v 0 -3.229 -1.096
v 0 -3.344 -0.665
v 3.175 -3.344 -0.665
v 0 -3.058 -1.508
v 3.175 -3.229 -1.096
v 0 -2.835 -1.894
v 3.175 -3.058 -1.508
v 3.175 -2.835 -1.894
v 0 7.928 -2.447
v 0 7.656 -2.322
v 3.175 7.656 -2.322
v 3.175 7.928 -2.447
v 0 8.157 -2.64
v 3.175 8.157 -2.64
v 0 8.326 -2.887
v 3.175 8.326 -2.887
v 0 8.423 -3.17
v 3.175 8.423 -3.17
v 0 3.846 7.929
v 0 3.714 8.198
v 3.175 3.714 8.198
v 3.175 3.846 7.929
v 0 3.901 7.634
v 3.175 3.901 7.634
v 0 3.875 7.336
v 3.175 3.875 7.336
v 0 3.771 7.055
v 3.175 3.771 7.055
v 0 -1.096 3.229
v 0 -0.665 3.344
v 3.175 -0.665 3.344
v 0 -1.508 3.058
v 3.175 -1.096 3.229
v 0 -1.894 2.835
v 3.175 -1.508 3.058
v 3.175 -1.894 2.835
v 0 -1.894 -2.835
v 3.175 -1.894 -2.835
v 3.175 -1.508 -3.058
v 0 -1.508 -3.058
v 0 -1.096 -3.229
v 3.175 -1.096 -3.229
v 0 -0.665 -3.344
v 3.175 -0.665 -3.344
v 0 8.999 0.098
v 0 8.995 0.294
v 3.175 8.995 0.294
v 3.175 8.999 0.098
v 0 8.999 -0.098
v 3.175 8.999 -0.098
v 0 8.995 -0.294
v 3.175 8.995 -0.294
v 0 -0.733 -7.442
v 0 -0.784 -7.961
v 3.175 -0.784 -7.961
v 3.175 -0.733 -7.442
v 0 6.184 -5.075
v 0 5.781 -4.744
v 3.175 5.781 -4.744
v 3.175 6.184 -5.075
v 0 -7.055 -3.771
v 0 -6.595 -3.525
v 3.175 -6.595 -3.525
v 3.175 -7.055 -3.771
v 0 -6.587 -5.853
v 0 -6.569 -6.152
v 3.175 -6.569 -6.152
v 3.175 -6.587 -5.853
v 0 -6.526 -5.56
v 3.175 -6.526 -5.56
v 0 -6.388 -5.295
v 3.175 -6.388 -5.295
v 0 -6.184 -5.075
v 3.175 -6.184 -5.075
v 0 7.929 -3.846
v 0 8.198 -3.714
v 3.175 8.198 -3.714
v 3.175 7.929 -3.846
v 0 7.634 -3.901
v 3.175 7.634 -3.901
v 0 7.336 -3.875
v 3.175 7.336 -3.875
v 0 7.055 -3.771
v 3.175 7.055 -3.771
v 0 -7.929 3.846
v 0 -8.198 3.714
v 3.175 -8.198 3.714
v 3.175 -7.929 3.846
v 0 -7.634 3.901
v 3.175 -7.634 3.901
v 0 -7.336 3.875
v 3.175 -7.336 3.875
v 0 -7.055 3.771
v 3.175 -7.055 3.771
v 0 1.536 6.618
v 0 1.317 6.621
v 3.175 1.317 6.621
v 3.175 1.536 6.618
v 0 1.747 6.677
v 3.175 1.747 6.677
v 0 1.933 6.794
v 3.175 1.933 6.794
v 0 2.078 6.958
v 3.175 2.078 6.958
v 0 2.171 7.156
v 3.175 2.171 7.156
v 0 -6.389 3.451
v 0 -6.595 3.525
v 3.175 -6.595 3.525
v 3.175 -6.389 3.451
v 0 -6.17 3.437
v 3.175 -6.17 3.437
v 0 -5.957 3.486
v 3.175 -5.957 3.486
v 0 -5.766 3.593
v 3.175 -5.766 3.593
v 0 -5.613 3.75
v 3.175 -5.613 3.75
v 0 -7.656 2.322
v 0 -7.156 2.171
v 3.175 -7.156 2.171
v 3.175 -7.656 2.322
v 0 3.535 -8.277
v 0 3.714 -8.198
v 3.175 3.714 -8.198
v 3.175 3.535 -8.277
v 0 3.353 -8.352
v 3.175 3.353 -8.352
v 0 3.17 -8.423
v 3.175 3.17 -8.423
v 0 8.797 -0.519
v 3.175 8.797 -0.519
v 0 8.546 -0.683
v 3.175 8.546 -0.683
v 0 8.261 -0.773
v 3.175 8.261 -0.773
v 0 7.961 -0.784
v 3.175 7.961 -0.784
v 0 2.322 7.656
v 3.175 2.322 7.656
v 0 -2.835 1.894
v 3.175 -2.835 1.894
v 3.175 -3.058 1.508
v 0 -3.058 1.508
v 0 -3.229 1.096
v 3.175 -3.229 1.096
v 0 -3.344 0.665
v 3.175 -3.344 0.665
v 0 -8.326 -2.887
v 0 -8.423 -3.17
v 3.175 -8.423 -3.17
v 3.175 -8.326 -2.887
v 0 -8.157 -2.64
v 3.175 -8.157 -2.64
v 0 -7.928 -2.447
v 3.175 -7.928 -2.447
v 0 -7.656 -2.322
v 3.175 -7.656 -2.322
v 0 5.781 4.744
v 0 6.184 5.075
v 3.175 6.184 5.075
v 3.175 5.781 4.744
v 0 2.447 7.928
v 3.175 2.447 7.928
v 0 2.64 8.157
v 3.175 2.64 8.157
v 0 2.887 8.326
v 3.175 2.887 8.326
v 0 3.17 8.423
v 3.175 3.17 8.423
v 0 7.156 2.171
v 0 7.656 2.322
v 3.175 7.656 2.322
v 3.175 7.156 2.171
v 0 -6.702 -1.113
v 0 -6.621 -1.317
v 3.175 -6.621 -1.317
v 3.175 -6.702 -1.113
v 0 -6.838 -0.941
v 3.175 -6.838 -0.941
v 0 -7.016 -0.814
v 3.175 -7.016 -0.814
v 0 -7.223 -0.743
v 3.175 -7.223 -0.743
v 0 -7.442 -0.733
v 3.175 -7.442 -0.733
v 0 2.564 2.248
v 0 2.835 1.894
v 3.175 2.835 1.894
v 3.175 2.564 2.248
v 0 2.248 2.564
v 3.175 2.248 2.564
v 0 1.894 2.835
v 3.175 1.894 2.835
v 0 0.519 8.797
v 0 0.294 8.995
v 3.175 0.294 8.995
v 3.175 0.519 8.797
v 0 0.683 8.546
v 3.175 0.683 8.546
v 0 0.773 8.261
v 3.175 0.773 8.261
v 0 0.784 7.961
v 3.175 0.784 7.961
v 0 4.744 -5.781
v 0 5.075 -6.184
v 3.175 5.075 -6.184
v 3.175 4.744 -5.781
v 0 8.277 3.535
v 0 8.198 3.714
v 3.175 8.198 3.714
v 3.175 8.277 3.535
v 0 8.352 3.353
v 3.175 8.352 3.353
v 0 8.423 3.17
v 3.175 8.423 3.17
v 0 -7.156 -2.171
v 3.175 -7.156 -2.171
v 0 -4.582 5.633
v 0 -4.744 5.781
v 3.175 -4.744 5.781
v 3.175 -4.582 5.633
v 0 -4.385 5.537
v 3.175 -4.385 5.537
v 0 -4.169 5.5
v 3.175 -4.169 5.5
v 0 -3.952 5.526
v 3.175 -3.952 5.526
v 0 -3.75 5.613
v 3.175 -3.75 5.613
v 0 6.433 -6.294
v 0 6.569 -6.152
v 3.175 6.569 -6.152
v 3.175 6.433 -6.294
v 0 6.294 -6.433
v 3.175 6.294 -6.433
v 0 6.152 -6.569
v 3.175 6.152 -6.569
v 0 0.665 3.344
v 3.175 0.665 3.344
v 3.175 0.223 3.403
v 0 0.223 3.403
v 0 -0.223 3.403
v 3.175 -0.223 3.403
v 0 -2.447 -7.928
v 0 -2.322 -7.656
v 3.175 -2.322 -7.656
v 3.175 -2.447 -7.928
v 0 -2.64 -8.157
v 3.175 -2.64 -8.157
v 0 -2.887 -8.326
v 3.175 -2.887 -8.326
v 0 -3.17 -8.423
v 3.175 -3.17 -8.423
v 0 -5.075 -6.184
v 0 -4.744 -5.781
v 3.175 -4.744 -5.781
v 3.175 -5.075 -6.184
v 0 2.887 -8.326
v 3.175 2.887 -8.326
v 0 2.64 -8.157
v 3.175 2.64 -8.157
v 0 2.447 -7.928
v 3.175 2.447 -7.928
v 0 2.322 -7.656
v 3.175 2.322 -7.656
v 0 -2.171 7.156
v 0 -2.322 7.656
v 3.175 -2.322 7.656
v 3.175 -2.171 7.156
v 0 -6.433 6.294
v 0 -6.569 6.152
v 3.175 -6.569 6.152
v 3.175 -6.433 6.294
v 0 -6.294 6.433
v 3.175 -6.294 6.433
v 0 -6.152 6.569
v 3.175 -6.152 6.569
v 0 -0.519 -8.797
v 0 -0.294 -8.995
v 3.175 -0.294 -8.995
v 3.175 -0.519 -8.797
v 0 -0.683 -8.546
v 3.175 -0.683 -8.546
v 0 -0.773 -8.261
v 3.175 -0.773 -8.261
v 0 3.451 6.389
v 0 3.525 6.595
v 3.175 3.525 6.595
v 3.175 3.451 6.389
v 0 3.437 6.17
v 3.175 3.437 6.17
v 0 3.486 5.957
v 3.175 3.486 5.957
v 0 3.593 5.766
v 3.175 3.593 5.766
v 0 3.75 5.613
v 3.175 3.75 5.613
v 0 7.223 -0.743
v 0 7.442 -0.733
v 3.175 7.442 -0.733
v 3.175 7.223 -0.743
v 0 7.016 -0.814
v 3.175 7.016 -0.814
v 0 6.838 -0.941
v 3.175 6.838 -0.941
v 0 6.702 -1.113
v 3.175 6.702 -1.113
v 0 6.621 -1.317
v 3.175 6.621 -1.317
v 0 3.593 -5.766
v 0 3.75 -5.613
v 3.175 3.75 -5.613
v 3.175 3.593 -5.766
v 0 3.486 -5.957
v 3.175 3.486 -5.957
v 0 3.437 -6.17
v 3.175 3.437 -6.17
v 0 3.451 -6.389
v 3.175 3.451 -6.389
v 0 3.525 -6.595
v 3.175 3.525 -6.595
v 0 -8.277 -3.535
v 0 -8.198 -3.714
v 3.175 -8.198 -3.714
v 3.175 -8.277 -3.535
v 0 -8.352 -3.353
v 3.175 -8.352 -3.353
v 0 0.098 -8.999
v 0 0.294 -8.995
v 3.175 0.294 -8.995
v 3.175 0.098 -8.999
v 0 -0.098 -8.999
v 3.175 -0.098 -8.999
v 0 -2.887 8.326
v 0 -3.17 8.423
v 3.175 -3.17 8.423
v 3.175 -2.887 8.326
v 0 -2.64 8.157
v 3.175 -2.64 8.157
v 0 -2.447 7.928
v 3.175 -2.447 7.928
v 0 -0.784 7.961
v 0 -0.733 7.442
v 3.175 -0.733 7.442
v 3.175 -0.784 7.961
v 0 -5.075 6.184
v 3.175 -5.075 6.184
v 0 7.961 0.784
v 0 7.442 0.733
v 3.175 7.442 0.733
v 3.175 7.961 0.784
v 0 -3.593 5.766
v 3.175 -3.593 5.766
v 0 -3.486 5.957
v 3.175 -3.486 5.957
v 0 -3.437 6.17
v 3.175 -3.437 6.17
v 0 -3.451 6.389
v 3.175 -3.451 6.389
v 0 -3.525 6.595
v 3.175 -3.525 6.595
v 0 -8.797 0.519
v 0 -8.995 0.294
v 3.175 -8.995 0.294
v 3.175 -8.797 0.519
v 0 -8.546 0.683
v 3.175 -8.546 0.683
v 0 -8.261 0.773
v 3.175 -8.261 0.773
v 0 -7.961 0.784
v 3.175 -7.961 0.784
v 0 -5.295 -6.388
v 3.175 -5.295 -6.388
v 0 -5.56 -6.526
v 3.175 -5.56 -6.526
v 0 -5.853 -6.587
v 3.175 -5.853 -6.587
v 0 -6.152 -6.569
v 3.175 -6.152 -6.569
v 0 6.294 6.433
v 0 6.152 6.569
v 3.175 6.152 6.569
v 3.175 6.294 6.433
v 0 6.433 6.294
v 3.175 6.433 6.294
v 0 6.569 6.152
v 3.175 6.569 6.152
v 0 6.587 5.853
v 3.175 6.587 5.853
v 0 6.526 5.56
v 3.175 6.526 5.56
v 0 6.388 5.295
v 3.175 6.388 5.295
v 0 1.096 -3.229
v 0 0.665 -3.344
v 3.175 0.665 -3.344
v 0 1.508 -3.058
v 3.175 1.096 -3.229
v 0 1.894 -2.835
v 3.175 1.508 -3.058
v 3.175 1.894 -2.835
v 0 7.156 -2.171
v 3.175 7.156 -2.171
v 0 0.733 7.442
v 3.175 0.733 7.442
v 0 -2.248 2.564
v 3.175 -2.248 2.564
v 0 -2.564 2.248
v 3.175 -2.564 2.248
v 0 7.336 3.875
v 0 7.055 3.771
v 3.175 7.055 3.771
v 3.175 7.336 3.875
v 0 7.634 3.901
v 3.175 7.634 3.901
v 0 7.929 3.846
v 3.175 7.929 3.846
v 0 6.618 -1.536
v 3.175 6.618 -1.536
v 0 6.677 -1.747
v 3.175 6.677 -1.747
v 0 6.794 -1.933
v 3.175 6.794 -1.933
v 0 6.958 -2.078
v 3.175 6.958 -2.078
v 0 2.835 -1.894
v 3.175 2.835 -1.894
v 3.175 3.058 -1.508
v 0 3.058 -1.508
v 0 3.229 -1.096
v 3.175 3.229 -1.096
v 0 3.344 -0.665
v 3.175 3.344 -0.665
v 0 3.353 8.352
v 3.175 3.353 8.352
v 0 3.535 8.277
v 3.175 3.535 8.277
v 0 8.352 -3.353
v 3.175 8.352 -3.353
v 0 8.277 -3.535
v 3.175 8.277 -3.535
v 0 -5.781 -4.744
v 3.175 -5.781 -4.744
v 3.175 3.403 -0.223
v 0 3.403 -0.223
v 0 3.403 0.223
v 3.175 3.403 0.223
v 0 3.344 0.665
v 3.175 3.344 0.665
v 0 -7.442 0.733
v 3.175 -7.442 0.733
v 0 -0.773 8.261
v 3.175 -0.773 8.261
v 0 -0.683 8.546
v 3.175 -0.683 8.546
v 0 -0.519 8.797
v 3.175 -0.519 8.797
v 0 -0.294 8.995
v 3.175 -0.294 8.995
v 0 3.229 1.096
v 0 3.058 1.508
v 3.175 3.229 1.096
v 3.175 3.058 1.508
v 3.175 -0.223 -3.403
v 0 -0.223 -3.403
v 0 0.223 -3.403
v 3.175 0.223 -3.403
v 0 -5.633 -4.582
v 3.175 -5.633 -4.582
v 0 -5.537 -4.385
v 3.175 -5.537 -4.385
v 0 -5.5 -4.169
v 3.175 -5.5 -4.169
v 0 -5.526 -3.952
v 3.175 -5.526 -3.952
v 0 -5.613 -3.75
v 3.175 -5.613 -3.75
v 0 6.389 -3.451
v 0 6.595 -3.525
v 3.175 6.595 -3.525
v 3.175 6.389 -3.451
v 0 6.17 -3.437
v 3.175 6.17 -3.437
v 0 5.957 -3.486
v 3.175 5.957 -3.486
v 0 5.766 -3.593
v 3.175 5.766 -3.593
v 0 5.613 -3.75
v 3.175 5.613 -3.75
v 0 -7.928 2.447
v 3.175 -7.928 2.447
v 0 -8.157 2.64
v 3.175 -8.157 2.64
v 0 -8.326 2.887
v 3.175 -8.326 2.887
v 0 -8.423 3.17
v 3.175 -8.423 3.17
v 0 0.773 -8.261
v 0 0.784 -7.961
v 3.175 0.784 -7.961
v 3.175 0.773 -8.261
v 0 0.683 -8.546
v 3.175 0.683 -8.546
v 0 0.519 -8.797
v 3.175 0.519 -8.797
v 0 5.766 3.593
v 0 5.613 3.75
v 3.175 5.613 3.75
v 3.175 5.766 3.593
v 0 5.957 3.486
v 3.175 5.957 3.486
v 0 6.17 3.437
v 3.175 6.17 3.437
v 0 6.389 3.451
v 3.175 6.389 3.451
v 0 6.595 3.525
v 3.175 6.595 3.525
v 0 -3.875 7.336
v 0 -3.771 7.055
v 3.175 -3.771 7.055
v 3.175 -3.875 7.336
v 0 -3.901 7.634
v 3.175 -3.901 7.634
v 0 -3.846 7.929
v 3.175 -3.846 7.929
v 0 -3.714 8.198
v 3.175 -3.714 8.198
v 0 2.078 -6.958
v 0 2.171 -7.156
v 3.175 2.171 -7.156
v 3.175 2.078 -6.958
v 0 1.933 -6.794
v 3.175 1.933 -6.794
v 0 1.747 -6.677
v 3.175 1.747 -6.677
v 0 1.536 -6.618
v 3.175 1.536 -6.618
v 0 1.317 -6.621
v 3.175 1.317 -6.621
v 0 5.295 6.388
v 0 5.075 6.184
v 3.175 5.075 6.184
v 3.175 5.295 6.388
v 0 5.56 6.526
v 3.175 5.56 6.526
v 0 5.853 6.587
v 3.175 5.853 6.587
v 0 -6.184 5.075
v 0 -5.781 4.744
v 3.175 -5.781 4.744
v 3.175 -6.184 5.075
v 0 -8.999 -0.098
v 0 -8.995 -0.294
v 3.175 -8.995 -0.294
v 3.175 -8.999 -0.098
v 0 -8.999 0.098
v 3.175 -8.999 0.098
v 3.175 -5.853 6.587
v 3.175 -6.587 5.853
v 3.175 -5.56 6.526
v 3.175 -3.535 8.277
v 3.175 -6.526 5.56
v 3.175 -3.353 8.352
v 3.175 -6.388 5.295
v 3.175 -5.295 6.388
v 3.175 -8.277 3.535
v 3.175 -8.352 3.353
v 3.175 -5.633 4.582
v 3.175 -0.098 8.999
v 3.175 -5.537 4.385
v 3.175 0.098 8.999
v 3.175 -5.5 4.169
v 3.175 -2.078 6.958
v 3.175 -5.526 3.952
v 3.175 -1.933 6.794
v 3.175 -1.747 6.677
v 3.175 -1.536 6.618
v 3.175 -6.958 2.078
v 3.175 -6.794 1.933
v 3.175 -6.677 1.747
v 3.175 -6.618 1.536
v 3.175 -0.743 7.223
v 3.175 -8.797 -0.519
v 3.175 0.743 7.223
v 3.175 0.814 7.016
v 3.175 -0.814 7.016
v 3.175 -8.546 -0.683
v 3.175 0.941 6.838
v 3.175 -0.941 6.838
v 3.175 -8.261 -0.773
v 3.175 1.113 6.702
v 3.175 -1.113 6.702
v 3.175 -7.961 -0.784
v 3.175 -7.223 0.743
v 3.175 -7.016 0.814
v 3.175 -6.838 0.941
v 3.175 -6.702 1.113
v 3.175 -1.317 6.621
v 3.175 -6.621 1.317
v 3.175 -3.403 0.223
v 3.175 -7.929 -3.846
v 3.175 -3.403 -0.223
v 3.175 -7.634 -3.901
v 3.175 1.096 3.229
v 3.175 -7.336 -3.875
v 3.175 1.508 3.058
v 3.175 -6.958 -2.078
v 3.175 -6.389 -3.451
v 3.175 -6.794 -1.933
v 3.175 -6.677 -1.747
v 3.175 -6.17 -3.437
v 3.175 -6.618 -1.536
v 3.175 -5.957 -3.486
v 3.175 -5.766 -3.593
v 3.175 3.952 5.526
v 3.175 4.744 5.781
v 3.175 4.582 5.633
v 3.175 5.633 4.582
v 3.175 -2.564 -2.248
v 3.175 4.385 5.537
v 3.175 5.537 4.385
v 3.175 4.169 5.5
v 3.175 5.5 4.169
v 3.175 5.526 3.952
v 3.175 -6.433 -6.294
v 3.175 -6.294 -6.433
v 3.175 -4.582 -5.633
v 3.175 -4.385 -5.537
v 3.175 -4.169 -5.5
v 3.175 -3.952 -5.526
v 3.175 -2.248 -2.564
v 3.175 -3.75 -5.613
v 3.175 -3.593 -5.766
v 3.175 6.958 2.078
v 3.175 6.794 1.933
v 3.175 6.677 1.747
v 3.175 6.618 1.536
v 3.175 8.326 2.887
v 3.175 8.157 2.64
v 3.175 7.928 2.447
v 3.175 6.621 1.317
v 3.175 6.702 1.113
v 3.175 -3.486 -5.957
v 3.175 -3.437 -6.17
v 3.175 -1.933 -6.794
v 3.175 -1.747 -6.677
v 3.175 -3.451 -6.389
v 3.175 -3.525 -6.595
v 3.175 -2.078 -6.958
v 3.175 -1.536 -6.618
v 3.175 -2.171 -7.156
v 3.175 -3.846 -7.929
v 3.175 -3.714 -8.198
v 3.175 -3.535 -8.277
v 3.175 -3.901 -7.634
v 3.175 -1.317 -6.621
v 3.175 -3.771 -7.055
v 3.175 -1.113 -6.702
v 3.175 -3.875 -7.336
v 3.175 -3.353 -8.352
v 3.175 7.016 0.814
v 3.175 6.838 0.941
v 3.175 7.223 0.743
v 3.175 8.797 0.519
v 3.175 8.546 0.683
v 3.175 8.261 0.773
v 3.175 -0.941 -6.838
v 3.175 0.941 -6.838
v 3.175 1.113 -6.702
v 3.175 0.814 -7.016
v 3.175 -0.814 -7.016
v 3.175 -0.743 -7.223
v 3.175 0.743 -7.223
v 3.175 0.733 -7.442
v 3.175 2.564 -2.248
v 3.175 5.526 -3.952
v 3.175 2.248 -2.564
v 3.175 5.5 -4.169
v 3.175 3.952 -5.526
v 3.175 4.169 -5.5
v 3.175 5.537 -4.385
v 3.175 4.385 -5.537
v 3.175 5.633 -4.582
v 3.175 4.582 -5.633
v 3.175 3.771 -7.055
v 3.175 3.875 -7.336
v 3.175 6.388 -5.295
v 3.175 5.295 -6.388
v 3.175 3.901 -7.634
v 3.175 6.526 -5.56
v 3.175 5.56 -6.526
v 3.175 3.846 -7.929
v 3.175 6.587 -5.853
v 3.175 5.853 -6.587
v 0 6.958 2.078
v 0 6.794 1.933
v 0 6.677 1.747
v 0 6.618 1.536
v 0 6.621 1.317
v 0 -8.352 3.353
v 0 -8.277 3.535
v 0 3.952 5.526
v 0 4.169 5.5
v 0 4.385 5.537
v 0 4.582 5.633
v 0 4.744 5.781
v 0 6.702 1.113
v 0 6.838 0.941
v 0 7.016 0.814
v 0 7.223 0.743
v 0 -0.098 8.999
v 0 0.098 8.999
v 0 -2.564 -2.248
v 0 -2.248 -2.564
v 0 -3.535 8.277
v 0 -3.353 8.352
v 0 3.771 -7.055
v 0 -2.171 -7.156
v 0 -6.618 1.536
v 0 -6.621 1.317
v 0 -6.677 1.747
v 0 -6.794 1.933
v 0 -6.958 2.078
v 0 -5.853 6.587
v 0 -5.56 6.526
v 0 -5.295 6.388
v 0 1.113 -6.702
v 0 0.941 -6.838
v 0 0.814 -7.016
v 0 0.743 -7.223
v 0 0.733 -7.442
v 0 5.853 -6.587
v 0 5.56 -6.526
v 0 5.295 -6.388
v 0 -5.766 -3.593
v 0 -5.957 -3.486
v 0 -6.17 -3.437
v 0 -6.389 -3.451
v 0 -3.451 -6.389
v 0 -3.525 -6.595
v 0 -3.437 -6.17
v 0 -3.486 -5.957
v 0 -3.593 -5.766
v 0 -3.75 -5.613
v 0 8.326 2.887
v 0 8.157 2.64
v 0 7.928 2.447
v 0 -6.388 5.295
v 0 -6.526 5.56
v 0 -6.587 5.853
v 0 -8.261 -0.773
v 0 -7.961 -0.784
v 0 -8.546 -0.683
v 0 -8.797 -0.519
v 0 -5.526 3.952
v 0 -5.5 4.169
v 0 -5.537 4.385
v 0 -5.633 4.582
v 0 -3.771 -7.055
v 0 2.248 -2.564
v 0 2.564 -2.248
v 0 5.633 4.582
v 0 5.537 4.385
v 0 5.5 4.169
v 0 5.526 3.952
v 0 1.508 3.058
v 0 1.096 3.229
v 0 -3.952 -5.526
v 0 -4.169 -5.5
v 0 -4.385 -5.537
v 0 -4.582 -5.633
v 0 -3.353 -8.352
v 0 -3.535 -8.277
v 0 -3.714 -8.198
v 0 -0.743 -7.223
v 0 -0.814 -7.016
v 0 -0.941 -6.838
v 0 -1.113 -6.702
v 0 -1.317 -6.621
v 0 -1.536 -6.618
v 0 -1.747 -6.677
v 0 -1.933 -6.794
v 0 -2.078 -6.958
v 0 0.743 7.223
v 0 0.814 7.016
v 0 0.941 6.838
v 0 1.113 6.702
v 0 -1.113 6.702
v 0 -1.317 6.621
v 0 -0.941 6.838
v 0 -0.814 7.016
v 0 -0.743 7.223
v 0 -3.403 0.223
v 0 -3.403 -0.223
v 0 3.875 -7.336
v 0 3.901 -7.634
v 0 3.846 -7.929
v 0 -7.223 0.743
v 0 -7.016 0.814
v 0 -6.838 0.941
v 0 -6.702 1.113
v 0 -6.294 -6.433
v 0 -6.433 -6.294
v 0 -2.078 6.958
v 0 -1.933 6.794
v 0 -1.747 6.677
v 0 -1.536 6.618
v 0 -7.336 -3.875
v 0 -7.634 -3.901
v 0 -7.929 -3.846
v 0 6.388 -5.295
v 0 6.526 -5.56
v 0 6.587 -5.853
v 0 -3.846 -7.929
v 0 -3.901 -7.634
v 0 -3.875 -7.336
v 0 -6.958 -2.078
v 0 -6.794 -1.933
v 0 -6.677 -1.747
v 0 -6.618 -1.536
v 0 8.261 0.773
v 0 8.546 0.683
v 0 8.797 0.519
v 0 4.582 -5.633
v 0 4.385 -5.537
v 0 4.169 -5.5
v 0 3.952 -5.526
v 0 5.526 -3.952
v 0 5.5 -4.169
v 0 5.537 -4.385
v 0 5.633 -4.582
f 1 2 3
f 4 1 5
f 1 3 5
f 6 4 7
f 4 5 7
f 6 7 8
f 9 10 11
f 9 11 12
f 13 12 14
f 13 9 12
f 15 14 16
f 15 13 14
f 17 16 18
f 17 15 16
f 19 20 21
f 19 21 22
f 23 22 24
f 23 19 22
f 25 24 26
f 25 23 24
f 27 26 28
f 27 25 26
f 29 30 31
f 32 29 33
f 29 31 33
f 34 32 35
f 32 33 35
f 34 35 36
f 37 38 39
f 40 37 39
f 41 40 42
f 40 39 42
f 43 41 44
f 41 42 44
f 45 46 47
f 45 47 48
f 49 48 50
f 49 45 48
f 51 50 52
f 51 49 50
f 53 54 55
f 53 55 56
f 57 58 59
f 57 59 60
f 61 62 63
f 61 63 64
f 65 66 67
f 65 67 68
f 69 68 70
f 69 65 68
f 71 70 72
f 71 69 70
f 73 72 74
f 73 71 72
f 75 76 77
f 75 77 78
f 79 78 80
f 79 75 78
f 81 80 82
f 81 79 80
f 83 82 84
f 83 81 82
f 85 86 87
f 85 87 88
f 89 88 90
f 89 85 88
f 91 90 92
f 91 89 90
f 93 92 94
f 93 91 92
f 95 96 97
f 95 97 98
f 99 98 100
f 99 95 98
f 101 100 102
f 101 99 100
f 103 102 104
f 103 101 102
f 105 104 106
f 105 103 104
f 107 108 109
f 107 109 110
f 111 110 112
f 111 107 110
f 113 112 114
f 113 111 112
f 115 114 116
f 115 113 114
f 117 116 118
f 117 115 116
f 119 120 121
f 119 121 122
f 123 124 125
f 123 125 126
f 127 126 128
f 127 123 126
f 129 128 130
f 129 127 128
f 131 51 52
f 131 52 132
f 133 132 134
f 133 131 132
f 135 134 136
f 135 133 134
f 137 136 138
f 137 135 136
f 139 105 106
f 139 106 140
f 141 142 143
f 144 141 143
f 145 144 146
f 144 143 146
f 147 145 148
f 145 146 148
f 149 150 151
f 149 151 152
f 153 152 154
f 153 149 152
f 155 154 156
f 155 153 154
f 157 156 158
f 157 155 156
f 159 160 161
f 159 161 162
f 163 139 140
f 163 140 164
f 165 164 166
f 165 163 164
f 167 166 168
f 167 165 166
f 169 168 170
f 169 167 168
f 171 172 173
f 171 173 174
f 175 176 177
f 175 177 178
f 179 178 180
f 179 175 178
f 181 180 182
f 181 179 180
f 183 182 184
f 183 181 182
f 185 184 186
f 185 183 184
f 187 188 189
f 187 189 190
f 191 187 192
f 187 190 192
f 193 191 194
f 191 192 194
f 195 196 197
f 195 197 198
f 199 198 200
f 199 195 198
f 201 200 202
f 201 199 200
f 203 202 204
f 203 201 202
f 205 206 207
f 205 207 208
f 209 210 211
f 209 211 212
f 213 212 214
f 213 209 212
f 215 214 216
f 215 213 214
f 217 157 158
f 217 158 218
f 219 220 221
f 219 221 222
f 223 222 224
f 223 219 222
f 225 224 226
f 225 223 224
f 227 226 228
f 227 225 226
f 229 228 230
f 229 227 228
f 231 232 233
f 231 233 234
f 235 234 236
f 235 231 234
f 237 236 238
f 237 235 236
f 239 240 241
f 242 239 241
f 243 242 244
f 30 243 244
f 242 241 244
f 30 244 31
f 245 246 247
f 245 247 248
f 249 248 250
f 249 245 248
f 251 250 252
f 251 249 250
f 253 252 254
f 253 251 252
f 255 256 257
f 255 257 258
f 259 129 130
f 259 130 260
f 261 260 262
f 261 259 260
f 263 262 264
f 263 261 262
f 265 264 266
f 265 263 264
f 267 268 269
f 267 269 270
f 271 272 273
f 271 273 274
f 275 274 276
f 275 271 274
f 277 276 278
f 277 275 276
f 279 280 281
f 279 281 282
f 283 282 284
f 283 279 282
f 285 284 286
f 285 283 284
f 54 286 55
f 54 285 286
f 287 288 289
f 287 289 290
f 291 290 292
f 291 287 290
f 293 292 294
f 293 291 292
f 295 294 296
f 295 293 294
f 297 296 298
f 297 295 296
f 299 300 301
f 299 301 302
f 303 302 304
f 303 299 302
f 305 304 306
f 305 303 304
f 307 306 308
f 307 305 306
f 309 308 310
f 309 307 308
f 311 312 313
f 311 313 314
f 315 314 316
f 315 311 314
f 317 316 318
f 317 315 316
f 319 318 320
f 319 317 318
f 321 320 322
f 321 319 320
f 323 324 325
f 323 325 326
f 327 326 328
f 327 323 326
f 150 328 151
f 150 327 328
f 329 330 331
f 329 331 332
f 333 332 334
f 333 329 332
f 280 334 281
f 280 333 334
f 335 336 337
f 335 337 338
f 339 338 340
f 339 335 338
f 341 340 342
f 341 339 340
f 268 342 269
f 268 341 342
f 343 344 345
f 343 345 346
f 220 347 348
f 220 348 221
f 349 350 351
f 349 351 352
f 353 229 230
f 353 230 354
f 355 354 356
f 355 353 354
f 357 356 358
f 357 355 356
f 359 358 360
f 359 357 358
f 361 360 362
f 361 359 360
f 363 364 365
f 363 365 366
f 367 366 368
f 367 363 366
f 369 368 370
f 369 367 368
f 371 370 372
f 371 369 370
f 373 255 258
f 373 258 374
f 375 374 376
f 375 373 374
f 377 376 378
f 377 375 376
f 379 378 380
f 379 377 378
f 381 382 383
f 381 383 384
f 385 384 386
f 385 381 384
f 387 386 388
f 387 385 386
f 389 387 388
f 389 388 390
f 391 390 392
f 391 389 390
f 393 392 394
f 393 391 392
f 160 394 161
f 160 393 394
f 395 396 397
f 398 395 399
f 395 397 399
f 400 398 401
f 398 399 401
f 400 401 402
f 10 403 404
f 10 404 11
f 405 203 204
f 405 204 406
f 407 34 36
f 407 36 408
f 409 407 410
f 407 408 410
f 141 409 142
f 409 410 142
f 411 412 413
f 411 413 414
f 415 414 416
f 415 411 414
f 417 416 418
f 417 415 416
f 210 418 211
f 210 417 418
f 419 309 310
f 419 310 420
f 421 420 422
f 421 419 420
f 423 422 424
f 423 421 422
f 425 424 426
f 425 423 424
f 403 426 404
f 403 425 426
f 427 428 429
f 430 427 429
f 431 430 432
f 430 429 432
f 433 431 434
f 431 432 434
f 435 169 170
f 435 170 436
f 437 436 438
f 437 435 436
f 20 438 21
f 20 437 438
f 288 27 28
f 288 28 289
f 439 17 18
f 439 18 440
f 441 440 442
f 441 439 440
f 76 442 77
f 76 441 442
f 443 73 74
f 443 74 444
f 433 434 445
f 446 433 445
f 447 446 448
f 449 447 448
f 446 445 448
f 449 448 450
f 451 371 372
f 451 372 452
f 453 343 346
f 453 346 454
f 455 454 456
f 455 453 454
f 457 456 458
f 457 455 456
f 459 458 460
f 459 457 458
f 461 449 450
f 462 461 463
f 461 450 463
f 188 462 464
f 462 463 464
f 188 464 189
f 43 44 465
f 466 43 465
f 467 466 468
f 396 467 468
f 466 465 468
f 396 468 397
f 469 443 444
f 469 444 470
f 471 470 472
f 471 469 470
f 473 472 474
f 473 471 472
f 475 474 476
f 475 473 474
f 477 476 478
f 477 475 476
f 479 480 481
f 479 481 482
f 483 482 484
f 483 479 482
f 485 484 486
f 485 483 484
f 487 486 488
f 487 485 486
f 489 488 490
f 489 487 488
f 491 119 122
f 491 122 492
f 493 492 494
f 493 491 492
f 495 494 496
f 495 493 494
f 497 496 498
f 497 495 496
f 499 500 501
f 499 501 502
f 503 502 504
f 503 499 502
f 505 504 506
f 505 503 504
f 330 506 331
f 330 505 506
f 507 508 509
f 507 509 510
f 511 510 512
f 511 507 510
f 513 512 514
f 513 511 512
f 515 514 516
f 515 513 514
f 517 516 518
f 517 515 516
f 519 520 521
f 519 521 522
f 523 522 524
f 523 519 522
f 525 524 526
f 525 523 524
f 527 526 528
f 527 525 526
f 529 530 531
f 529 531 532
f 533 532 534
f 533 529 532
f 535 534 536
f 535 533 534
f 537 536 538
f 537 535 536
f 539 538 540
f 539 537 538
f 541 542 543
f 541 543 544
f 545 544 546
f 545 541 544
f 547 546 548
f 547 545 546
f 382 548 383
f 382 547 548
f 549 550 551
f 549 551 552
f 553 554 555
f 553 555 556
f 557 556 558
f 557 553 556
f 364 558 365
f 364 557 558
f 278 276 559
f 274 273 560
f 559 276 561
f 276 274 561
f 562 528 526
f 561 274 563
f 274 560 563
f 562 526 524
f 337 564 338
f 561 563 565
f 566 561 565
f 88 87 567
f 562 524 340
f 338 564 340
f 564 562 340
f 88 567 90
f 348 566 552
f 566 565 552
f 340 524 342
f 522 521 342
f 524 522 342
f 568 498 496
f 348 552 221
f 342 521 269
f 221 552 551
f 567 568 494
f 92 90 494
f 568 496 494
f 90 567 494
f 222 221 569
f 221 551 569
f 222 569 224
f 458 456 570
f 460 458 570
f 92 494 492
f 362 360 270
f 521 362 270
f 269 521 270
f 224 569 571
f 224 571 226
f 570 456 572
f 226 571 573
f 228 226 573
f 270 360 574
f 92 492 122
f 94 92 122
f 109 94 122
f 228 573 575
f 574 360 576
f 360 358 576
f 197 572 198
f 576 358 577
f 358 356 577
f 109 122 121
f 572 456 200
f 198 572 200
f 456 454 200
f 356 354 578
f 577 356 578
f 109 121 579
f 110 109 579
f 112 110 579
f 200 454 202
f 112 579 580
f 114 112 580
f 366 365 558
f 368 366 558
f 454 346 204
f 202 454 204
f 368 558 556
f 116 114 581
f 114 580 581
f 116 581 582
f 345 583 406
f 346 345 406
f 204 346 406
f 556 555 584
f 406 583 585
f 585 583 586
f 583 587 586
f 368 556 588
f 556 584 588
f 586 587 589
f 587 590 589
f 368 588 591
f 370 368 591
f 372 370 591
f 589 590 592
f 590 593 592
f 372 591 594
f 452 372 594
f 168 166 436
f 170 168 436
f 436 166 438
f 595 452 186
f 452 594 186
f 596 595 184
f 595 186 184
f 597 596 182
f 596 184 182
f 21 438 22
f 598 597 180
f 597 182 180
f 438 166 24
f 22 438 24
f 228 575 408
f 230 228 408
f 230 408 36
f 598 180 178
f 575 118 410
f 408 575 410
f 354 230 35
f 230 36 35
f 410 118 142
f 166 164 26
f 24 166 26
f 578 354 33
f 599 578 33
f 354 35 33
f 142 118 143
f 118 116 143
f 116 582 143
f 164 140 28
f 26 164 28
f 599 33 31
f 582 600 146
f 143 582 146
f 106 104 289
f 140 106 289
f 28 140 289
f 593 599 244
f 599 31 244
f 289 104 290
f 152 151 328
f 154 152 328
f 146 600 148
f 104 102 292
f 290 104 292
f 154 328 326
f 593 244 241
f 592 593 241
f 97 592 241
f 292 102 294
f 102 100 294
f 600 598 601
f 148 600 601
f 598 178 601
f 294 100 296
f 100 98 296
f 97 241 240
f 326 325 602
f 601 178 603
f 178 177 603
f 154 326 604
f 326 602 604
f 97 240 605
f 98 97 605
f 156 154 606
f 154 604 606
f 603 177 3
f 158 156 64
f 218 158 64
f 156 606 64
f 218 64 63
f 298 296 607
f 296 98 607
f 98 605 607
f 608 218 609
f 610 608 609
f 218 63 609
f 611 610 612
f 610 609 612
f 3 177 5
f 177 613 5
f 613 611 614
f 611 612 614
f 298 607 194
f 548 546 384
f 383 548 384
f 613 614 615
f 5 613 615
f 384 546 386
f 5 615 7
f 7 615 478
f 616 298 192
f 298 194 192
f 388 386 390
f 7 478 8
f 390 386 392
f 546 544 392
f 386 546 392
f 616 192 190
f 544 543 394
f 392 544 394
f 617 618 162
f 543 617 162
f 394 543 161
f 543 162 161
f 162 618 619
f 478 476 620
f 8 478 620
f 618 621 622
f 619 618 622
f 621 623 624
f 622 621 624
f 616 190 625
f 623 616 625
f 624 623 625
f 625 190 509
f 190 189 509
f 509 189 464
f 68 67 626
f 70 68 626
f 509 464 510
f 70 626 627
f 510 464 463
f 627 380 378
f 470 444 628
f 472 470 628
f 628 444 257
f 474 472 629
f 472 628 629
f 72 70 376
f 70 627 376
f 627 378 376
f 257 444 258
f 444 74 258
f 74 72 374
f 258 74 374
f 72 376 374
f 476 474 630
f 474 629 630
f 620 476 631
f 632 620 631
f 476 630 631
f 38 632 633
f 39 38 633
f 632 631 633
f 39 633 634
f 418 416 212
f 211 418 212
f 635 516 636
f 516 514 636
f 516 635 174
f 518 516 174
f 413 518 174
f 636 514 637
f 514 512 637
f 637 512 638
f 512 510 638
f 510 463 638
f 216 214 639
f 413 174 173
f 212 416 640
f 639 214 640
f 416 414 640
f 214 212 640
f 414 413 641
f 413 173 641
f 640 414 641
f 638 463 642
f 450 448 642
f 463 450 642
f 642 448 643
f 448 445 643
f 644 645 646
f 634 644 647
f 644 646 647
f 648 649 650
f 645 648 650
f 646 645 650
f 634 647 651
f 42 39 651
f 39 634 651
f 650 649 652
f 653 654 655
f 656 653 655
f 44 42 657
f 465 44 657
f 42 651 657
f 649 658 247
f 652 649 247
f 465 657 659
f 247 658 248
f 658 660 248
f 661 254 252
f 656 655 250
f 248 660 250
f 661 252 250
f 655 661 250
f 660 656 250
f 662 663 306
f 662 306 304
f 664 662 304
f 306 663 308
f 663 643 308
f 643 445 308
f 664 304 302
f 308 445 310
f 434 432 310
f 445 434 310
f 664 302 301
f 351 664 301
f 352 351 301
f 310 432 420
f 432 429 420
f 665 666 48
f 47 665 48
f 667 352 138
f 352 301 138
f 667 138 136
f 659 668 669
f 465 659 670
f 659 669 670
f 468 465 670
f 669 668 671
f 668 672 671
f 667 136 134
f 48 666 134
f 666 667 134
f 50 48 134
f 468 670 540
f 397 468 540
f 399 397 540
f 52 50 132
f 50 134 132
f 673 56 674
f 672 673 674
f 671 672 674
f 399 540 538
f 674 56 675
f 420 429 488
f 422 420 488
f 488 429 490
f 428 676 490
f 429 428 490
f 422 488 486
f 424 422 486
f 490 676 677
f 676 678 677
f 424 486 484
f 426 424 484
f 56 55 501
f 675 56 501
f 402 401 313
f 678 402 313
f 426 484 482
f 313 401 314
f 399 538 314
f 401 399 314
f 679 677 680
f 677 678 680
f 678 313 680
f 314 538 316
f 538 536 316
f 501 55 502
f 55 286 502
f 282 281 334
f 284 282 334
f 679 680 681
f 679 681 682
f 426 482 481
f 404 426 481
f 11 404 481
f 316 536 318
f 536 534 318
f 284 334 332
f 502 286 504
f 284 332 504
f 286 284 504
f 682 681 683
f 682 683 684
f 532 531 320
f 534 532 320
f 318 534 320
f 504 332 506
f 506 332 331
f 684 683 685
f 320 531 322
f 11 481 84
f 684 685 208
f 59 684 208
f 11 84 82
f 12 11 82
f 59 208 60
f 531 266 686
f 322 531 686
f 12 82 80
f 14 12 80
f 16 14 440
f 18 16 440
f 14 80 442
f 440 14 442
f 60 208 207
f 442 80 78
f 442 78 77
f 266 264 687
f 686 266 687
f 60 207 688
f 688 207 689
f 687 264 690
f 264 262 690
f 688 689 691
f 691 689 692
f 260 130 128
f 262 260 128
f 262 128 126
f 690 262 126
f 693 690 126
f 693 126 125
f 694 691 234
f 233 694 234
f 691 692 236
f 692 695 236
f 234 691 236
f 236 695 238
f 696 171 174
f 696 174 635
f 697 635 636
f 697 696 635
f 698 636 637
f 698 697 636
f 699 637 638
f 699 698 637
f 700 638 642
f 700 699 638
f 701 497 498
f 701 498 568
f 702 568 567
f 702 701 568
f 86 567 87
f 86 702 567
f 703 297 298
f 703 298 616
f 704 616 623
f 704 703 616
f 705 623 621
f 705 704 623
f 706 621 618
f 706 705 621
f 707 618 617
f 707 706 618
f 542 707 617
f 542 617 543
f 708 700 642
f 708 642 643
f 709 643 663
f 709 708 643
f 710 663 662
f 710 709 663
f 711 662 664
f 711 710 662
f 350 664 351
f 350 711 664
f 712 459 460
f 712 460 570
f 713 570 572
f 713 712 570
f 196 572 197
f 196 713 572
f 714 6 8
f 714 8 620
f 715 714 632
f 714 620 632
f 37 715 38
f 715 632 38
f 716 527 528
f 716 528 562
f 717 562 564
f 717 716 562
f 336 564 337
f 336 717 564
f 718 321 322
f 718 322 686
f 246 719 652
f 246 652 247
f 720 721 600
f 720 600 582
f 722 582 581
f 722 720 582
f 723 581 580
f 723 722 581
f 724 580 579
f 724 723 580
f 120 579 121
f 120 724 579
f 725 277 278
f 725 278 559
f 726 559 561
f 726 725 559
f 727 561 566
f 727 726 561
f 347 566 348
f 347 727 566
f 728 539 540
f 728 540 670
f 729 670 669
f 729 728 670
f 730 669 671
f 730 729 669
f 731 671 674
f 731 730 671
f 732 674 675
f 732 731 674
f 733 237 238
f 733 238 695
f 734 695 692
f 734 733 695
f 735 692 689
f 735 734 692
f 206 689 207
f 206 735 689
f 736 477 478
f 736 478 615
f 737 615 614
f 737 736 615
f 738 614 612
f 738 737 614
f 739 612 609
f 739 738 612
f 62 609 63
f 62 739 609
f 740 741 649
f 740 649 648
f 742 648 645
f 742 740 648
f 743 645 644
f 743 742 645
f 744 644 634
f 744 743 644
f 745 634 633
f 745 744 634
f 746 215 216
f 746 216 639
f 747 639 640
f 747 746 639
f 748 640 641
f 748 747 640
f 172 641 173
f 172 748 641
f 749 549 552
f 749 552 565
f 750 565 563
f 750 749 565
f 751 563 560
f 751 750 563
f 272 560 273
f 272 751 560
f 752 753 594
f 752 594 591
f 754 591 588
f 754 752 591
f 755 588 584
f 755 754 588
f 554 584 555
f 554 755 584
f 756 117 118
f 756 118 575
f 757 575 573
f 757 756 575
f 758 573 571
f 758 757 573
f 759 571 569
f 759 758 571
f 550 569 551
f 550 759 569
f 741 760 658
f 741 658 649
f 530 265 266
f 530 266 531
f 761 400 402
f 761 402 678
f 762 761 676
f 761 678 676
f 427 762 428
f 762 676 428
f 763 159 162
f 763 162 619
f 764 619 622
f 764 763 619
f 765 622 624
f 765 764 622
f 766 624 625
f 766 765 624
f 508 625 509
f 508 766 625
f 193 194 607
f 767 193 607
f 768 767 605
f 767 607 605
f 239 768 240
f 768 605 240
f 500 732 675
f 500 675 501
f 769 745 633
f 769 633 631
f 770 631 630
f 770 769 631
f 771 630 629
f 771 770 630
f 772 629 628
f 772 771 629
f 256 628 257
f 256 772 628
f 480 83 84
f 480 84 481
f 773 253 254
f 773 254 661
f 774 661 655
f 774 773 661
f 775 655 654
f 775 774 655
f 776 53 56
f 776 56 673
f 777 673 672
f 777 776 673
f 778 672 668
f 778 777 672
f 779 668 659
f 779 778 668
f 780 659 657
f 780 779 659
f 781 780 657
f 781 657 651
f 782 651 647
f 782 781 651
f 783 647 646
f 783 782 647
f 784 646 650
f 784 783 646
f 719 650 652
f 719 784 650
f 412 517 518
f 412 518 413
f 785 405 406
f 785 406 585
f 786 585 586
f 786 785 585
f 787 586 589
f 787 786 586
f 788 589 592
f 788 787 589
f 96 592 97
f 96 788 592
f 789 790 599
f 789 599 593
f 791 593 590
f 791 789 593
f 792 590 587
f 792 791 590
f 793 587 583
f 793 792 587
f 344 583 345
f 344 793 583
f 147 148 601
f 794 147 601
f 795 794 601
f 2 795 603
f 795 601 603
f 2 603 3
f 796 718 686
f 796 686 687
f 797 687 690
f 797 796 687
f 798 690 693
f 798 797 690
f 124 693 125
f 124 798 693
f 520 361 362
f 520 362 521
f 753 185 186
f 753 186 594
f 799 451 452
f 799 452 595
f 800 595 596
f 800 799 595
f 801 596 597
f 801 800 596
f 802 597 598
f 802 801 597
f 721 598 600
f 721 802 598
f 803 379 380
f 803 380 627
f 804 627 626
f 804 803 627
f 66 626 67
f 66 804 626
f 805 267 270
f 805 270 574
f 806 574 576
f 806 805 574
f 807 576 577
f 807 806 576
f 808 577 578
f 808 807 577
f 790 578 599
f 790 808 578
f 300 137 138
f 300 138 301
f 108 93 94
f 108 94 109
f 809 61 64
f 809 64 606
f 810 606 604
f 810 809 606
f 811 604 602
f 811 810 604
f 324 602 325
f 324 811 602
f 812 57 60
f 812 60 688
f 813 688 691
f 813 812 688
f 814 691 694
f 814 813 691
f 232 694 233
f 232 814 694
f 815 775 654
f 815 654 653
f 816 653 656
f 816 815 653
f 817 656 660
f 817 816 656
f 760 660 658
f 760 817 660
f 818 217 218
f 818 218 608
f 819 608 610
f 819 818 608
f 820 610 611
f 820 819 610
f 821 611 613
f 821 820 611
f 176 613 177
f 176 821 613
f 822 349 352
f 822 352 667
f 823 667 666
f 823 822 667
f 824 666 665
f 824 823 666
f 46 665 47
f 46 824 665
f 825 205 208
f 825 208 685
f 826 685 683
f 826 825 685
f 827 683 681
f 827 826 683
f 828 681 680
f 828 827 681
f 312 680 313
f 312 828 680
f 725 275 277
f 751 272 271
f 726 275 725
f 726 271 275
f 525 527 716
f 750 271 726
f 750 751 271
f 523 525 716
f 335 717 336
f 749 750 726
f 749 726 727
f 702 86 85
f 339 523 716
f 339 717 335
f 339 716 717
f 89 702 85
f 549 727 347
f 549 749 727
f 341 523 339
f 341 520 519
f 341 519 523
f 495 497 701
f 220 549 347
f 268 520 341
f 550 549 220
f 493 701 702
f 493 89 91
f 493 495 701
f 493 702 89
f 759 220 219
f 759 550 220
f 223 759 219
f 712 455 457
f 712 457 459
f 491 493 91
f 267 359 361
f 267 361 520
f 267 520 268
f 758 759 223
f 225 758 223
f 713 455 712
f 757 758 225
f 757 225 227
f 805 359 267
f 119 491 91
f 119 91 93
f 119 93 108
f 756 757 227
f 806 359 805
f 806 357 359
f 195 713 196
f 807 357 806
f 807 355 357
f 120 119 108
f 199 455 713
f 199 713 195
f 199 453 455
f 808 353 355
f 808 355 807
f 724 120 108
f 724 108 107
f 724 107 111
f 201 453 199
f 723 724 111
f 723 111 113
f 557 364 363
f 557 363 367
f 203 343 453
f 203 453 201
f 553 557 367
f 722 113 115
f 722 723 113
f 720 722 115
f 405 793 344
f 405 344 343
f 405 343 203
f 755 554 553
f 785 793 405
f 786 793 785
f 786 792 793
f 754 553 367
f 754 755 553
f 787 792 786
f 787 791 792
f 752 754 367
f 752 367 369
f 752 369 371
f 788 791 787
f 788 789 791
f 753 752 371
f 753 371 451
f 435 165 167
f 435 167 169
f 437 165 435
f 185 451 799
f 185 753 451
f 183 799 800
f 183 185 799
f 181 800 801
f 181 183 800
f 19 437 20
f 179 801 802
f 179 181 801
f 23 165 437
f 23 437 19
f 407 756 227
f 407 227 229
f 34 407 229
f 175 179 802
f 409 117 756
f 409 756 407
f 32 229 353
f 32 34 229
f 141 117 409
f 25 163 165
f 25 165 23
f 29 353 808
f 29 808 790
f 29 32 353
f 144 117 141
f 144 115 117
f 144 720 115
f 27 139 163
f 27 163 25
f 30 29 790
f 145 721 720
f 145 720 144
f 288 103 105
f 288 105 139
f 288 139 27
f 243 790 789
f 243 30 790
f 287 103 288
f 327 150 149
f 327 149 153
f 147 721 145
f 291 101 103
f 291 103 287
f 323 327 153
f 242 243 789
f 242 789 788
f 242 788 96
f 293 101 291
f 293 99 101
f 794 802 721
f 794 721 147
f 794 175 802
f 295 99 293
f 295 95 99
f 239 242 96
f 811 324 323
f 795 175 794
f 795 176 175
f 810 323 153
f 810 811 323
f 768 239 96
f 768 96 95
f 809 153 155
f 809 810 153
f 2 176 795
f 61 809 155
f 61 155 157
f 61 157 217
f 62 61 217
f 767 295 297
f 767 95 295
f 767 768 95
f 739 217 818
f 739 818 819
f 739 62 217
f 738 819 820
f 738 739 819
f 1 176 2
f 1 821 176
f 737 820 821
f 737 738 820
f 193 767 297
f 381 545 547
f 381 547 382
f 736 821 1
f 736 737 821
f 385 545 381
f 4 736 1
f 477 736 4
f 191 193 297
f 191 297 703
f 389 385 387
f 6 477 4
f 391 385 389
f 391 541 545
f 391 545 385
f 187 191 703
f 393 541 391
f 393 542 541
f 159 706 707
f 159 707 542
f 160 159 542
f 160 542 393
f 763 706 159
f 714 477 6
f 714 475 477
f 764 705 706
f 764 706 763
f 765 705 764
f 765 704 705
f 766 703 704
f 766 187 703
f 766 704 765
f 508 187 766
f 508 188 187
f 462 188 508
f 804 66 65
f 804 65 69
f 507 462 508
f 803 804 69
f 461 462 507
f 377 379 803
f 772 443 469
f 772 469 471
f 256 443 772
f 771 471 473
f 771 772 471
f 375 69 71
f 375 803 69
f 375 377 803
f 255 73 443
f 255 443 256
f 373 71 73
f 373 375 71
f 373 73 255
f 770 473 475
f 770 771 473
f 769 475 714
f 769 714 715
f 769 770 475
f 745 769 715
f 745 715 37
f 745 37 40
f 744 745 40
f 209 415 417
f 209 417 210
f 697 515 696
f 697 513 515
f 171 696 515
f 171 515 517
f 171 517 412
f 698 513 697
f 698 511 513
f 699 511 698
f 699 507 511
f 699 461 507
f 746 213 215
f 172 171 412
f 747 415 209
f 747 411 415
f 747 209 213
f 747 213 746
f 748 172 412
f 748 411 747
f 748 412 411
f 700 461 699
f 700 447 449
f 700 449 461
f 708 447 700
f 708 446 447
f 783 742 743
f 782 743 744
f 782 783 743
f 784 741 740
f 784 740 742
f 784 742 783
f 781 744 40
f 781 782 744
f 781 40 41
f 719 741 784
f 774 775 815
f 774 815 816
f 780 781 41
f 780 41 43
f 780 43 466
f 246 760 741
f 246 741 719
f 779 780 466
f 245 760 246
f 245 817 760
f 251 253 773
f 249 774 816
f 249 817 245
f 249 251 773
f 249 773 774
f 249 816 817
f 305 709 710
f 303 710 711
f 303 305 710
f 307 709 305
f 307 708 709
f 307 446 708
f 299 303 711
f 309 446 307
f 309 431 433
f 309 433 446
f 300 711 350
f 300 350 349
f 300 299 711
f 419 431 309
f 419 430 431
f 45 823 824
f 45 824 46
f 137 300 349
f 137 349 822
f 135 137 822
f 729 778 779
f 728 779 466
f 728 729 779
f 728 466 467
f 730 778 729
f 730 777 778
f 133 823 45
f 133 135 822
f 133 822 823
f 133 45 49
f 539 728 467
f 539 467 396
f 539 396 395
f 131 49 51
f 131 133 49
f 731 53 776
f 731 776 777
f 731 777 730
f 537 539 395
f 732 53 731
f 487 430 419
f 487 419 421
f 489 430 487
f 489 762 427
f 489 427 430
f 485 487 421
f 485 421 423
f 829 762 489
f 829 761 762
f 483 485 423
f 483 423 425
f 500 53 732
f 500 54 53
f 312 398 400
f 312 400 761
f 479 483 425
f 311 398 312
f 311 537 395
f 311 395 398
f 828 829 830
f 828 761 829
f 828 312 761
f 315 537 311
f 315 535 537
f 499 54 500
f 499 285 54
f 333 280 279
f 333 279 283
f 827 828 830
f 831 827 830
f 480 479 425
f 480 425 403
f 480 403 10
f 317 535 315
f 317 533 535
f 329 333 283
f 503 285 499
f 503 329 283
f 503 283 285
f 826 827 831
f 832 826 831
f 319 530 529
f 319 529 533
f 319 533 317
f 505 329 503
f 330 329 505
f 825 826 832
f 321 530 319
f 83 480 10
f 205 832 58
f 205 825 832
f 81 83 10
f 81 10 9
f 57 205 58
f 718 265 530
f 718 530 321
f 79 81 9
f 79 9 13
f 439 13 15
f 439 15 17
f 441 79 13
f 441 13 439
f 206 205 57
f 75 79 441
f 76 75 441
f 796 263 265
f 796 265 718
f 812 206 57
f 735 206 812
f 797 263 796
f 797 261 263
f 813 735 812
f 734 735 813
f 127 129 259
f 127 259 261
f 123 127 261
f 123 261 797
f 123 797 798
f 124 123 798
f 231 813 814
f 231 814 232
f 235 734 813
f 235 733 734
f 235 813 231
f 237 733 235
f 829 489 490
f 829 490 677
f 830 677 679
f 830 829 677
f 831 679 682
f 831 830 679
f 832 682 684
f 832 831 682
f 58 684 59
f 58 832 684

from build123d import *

# Parameters (mm, degrees)
BOSS_EXTRUDE2_DEPTH = 3.175
FILLET1_R           = 0.767540966
CIRPATTERN1_COUNT   = 16
SKETCH2_R           = 3.41
CUT_EXTRUDE1_DEPTH  = 14.117950488


with BuildPart() as part:
    # Sketch1 → Boss-Extrude2 (new body)
    with BuildSketch(Plane(origin=(0, 0, 0), x_dir=(0, 0, -1), z_dir=(1, 0, 0))):
        with BuildLine():
            Line((6.717496905, 0.661615697), (7.961477813, 0.784137123))
            ThreePointArc((7.961477813, 0.784137123), (8.546163052, 0.682503707), (8.995181287, 0.294471745))
            ThreePointArc((8.995181287, 0.294471745), (9, 0), (8.995181287, -0.294471745))
            ThreePointArc((8.995181287, -0.294471745), (8.546163052, -0.682503707), (7.961477813, -0.784137123))
            Line((7.961477813, -0.784137123), (6.717496905, -0.661615697))
            ThreePointArc((6.717496905, -0.661615697), (6.676941442, -0.990430703), (6.620300643, -1.316859674))
            Line((6.620300643, -1.316859674), (0, 0))
            Line((0, 0), (6.620300643, 1.316859674))
            ThreePointArc((6.620300643, 1.316859674), (6.676941442, 0.990430703), (6.717496905, 0.661615697))
        make_face()
    extrude(amount=BOSS_EXTRUDE2_DEPTH)

    # Fillet1
    # the kernel refuses this fillet: 0.767540966 mm, written as the material it adds along each edge
    with BuildSketch(Plane(origin=(0, 0.661615697, -6.717496905), x_dir=(0, 0.9888733768354266, 0.14875968736892464), z_dir=(1, 0, 0))) as fillet1_piece_1_section:
        with BuildLine():
            CenterArc((0.729311441, -0.766537545), FILLET1_R, 92.930055473, 84.139889054)
            Line((-0.037226104, -0.727303285), (0, 0))
            ThreePointArc((0, 0), (0.345038591, -0.008824407), (0.690077182, 0))
        make_face()
    fillet1_piece_1 = extrude(amount=3.175, mode=Mode.PRIVATE)
    fillet1_piece_1 = split(fillet1_piece_1, bisect_by=Plane(origin=(1.5875, 1.34516519, -6.762602082), z_dir=(0, -0.9807852804032304, -0.19509032201612872)), keep=Keep.TOP, mode=Mode.PRIVATE)
    add(fillet1_piece_1)
    with BuildSketch(Plane(origin=(0, -0.661615697, -6.717496905), x_dir=(0, -0.09801714032956141, -0.9951847266721968), z_dir=(1, 0, 0))) as fillet1_piece_2_section:
        with BuildLine():
            CenterArc((0.728255348, -0.767540966), FILLET1_R, 90, 84.139889054)
            ThreePointArc((-0.035274557, -0.68917503), (-0.008824407, -0.345038591), (0, 0))
            Line((0, 0), (0.728255348, 0))
        make_face()
    fillet1_piece_2 = extrude(amount=3.175, mode=Mode.PRIVATE)
    fillet1_piece_2 = split(fillet1_piece_2, bisect_by=Plane(origin=(1.5875, -1.34516519, -6.762602082), z_dir=(0, 0.9807852804032304, -0.19509032201612872)), keep=Keep.TOP, mode=Mode.PRIVATE)
    add(fillet1_piece_2)


with BuildPart() as cirpattern1_1:
    # CirPattern1: pattern copy
    add(part.part.rotate(Axis((0, 0, 0), (1, 0, 0)), 1 * 360 / CIRPATTERN1_COUNT))


with BuildPart() as cirpattern1_2:
    # CirPattern1: pattern copy
    add(part.part.rotate(Axis((0, 0, 0), (1, 0, 0)), 2 * 360 / CIRPATTERN1_COUNT))


with BuildPart() as cirpattern1_3:
    # CirPattern1: pattern copy
    add(part.part.rotate(Axis((0, 0, 0), (1, 0, 0)), 3 * 360 / CIRPATTERN1_COUNT))


with BuildPart() as cirpattern1_4:
    # CirPattern1: pattern copy
    add(part.part.rotate(Axis((0, 0, 0), (1, 0, 0)), 4 * 360 / CIRPATTERN1_COUNT))


with BuildPart() as cirpattern1_5:
    # CirPattern1: pattern copy
    add(part.part.rotate(Axis((0, 0, 0), (1, 0, 0)), 5 * 360 / CIRPATTERN1_COUNT))


with BuildPart() as cirpattern1_6:
    # CirPattern1: pattern copy
    add(part.part.rotate(Axis((0, 0, 0), (1, 0, 0)), 6 * 360 / CIRPATTERN1_COUNT))


with BuildPart() as cirpattern1_7:
    # CirPattern1: pattern copy
    add(part.part.rotate(Axis((0, 0, 0), (1, 0, 0)), 7 * 360 / CIRPATTERN1_COUNT))


with BuildPart() as cirpattern1_8:
    # CirPattern1: pattern copy
    add(part.part.rotate(Axis((0, 0, 0), (1, 0, 0)), 8 * 360 / CIRPATTERN1_COUNT))


with BuildPart() as cirpattern1_9:
    # CirPattern1: pattern copy
    add(part.part.rotate(Axis((0, 0, 0), (1, 0, 0)), 9 * 360 / CIRPATTERN1_COUNT))


with BuildPart() as cirpattern1_10:
    # CirPattern1: pattern copy
    add(part.part.rotate(Axis((0, 0, 0), (1, 0, 0)), 10 * 360 / CIRPATTERN1_COUNT))


with BuildPart() as cirpattern1_11:
    # CirPattern1: pattern copy
    add(part.part.rotate(Axis((0, 0, 0), (1, 0, 0)), 11 * 360 / CIRPATTERN1_COUNT))


with BuildPart() as cirpattern1_12:
    # CirPattern1: pattern copy
    add(part.part.rotate(Axis((0, 0, 0), (1, 0, 0)), 12 * 360 / CIRPATTERN1_COUNT))


with BuildPart() as cirpattern1_13:
    # CirPattern1: pattern copy
    add(part.part.rotate(Axis((0, 0, 0), (1, 0, 0)), 13 * 360 / CIRPATTERN1_COUNT))


with BuildPart() as cirpattern1_14:
    # CirPattern1: pattern copy
    add(part.part.rotate(Axis((0, 0, 0), (1, 0, 0)), 14 * 360 / CIRPATTERN1_COUNT))


with BuildPart() as cirpattern1_15:
    # CirPattern1: pattern copy
    add(part.part.rotate(Axis((0, 0, 0), (1, 0, 0)), 15 * 360 / CIRPATTERN1_COUNT))


with BuildPart() as cut_extrude1_tool:
    # Sketch2 → Cut-Extrude1 (new, through all)
    with BuildSketch(Plane(origin=(3.175, 0, 0), x_dir=(0, 0, -1), z_dir=(1, 0, 0))):
        Circle(SKETCH2_R)
    extrude(amount=-CUT_EXTRUDE1_DEPTH)


with BuildPart() as part_1:
    add(part.part)

    # Cut-Extrude1: cut by cut_extrude1_tool
    add(cut_extrude1_tool.part, mode=Mode.SUBTRACT)


with BuildPart() as cirpattern1_1_1:
    add(cirpattern1_1.part)

    # Cut-Extrude1: cut by cut_extrude1_tool
    add(cut_extrude1_tool.part, mode=Mode.SUBTRACT)


with BuildPart() as cirpattern1_2_1:
    add(cirpattern1_2.part)

    # Cut-Extrude1: cut by cut_extrude1_tool
    add(cut_extrude1_tool.part, mode=Mode.SUBTRACT)


with BuildPart() as cirpattern1_3_1:
    add(cirpattern1_3.part)

    # Cut-Extrude1: cut by cut_extrude1_tool
    add(cut_extrude1_tool.part, mode=Mode.SUBTRACT)


with BuildPart() as cirpattern1_4_1:
    add(cirpattern1_4.part)

    # Cut-Extrude1: cut by cut_extrude1_tool
    add(cut_extrude1_tool.part, mode=Mode.SUBTRACT)


with BuildPart() as cirpattern1_5_1:
    add(cirpattern1_5.part)

    # Cut-Extrude1: cut by cut_extrude1_tool
    add(cut_extrude1_tool.part, mode=Mode.SUBTRACT)


with BuildPart() as cirpattern1_6_1:
    add(cirpattern1_6.part)

    # Cut-Extrude1: cut by cut_extrude1_tool
    add(cut_extrude1_tool.part, mode=Mode.SUBTRACT)


with BuildPart() as cirpattern1_7_1:
    add(cirpattern1_7.part)

    # Cut-Extrude1: cut by cut_extrude1_tool
    add(cut_extrude1_tool.part, mode=Mode.SUBTRACT)


with BuildPart() as cirpattern1_8_1:
    add(cirpattern1_8.part)

    # Cut-Extrude1: cut by cut_extrude1_tool
    add(cut_extrude1_tool.part, mode=Mode.SUBTRACT)


with BuildPart() as cirpattern1_9_1:
    add(cirpattern1_9.part)

    # Cut-Extrude1: cut by cut_extrude1_tool
    add(cut_extrude1_tool.part, mode=Mode.SUBTRACT)


with BuildPart() as cirpattern1_10_1:
    add(cirpattern1_10.part)

    # Cut-Extrude1: cut by cut_extrude1_tool
    add(cut_extrude1_tool.part, mode=Mode.SUBTRACT)


with BuildPart() as cirpattern1_11_1:
    add(cirpattern1_11.part)

    # Cut-Extrude1: cut by cut_extrude1_tool
    add(cut_extrude1_tool.part, mode=Mode.SUBTRACT)


with BuildPart() as cirpattern1_12_1:
    add(cirpattern1_12.part)

    # Cut-Extrude1: cut by cut_extrude1_tool
    add(cut_extrude1_tool.part, mode=Mode.SUBTRACT)


with BuildPart() as cirpattern1_13_1:
    add(cirpattern1_13.part)

    # Cut-Extrude1: cut by cut_extrude1_tool
    add(cut_extrude1_tool.part, mode=Mode.SUBTRACT)


with BuildPart() as cirpattern1_14_1:
    add(cirpattern1_14.part)

    # Cut-Extrude1: cut by cut_extrude1_tool
    add(cut_extrude1_tool.part, mode=Mode.SUBTRACT)


with BuildPart() as cirpattern1_15_1:
    add(cirpattern1_15.part)

    # Cut-Extrude1: cut by cut_extrude1_tool
    add(cut_extrude1_tool.part, mode=Mode.SUBTRACT)


with BuildPart() as cirpattern1_13_2:
    add(cirpattern1_13_1.part)

    # Combine1: union CirPattern1_1, CirPattern1_14, CirPattern1_2, CirPattern1_15, CirPattern1_3, part, CirPattern1_4, CirPattern1_5, CirPattern1_6, CirPattern1_7, CirPattern1_8, CirPattern1_9, CirPattern1_10, CirPattern1_11, CirPattern1_12
    add(cirpattern1_1_1.part)
    add(cirpattern1_14_1.part)
    add(cirpattern1_2_1.part)
    add(cirpattern1_15_1.part)
    add(cirpattern1_3_1.part)
    add(part_1.part)
    add(cirpattern1_4_1.part)
    add(cirpattern1_5_1.part)
    add(cirpattern1_6_1.part)
    add(cirpattern1_7_1.part)
    add(cirpattern1_8_1.part)
    add(cirpattern1_9_1.part)
    add(cirpattern1_10_1.part)
    add(cirpattern1_11_1.part)
    add(cirpattern1_12_1.part)


solid = cirpattern1_13_2.part
